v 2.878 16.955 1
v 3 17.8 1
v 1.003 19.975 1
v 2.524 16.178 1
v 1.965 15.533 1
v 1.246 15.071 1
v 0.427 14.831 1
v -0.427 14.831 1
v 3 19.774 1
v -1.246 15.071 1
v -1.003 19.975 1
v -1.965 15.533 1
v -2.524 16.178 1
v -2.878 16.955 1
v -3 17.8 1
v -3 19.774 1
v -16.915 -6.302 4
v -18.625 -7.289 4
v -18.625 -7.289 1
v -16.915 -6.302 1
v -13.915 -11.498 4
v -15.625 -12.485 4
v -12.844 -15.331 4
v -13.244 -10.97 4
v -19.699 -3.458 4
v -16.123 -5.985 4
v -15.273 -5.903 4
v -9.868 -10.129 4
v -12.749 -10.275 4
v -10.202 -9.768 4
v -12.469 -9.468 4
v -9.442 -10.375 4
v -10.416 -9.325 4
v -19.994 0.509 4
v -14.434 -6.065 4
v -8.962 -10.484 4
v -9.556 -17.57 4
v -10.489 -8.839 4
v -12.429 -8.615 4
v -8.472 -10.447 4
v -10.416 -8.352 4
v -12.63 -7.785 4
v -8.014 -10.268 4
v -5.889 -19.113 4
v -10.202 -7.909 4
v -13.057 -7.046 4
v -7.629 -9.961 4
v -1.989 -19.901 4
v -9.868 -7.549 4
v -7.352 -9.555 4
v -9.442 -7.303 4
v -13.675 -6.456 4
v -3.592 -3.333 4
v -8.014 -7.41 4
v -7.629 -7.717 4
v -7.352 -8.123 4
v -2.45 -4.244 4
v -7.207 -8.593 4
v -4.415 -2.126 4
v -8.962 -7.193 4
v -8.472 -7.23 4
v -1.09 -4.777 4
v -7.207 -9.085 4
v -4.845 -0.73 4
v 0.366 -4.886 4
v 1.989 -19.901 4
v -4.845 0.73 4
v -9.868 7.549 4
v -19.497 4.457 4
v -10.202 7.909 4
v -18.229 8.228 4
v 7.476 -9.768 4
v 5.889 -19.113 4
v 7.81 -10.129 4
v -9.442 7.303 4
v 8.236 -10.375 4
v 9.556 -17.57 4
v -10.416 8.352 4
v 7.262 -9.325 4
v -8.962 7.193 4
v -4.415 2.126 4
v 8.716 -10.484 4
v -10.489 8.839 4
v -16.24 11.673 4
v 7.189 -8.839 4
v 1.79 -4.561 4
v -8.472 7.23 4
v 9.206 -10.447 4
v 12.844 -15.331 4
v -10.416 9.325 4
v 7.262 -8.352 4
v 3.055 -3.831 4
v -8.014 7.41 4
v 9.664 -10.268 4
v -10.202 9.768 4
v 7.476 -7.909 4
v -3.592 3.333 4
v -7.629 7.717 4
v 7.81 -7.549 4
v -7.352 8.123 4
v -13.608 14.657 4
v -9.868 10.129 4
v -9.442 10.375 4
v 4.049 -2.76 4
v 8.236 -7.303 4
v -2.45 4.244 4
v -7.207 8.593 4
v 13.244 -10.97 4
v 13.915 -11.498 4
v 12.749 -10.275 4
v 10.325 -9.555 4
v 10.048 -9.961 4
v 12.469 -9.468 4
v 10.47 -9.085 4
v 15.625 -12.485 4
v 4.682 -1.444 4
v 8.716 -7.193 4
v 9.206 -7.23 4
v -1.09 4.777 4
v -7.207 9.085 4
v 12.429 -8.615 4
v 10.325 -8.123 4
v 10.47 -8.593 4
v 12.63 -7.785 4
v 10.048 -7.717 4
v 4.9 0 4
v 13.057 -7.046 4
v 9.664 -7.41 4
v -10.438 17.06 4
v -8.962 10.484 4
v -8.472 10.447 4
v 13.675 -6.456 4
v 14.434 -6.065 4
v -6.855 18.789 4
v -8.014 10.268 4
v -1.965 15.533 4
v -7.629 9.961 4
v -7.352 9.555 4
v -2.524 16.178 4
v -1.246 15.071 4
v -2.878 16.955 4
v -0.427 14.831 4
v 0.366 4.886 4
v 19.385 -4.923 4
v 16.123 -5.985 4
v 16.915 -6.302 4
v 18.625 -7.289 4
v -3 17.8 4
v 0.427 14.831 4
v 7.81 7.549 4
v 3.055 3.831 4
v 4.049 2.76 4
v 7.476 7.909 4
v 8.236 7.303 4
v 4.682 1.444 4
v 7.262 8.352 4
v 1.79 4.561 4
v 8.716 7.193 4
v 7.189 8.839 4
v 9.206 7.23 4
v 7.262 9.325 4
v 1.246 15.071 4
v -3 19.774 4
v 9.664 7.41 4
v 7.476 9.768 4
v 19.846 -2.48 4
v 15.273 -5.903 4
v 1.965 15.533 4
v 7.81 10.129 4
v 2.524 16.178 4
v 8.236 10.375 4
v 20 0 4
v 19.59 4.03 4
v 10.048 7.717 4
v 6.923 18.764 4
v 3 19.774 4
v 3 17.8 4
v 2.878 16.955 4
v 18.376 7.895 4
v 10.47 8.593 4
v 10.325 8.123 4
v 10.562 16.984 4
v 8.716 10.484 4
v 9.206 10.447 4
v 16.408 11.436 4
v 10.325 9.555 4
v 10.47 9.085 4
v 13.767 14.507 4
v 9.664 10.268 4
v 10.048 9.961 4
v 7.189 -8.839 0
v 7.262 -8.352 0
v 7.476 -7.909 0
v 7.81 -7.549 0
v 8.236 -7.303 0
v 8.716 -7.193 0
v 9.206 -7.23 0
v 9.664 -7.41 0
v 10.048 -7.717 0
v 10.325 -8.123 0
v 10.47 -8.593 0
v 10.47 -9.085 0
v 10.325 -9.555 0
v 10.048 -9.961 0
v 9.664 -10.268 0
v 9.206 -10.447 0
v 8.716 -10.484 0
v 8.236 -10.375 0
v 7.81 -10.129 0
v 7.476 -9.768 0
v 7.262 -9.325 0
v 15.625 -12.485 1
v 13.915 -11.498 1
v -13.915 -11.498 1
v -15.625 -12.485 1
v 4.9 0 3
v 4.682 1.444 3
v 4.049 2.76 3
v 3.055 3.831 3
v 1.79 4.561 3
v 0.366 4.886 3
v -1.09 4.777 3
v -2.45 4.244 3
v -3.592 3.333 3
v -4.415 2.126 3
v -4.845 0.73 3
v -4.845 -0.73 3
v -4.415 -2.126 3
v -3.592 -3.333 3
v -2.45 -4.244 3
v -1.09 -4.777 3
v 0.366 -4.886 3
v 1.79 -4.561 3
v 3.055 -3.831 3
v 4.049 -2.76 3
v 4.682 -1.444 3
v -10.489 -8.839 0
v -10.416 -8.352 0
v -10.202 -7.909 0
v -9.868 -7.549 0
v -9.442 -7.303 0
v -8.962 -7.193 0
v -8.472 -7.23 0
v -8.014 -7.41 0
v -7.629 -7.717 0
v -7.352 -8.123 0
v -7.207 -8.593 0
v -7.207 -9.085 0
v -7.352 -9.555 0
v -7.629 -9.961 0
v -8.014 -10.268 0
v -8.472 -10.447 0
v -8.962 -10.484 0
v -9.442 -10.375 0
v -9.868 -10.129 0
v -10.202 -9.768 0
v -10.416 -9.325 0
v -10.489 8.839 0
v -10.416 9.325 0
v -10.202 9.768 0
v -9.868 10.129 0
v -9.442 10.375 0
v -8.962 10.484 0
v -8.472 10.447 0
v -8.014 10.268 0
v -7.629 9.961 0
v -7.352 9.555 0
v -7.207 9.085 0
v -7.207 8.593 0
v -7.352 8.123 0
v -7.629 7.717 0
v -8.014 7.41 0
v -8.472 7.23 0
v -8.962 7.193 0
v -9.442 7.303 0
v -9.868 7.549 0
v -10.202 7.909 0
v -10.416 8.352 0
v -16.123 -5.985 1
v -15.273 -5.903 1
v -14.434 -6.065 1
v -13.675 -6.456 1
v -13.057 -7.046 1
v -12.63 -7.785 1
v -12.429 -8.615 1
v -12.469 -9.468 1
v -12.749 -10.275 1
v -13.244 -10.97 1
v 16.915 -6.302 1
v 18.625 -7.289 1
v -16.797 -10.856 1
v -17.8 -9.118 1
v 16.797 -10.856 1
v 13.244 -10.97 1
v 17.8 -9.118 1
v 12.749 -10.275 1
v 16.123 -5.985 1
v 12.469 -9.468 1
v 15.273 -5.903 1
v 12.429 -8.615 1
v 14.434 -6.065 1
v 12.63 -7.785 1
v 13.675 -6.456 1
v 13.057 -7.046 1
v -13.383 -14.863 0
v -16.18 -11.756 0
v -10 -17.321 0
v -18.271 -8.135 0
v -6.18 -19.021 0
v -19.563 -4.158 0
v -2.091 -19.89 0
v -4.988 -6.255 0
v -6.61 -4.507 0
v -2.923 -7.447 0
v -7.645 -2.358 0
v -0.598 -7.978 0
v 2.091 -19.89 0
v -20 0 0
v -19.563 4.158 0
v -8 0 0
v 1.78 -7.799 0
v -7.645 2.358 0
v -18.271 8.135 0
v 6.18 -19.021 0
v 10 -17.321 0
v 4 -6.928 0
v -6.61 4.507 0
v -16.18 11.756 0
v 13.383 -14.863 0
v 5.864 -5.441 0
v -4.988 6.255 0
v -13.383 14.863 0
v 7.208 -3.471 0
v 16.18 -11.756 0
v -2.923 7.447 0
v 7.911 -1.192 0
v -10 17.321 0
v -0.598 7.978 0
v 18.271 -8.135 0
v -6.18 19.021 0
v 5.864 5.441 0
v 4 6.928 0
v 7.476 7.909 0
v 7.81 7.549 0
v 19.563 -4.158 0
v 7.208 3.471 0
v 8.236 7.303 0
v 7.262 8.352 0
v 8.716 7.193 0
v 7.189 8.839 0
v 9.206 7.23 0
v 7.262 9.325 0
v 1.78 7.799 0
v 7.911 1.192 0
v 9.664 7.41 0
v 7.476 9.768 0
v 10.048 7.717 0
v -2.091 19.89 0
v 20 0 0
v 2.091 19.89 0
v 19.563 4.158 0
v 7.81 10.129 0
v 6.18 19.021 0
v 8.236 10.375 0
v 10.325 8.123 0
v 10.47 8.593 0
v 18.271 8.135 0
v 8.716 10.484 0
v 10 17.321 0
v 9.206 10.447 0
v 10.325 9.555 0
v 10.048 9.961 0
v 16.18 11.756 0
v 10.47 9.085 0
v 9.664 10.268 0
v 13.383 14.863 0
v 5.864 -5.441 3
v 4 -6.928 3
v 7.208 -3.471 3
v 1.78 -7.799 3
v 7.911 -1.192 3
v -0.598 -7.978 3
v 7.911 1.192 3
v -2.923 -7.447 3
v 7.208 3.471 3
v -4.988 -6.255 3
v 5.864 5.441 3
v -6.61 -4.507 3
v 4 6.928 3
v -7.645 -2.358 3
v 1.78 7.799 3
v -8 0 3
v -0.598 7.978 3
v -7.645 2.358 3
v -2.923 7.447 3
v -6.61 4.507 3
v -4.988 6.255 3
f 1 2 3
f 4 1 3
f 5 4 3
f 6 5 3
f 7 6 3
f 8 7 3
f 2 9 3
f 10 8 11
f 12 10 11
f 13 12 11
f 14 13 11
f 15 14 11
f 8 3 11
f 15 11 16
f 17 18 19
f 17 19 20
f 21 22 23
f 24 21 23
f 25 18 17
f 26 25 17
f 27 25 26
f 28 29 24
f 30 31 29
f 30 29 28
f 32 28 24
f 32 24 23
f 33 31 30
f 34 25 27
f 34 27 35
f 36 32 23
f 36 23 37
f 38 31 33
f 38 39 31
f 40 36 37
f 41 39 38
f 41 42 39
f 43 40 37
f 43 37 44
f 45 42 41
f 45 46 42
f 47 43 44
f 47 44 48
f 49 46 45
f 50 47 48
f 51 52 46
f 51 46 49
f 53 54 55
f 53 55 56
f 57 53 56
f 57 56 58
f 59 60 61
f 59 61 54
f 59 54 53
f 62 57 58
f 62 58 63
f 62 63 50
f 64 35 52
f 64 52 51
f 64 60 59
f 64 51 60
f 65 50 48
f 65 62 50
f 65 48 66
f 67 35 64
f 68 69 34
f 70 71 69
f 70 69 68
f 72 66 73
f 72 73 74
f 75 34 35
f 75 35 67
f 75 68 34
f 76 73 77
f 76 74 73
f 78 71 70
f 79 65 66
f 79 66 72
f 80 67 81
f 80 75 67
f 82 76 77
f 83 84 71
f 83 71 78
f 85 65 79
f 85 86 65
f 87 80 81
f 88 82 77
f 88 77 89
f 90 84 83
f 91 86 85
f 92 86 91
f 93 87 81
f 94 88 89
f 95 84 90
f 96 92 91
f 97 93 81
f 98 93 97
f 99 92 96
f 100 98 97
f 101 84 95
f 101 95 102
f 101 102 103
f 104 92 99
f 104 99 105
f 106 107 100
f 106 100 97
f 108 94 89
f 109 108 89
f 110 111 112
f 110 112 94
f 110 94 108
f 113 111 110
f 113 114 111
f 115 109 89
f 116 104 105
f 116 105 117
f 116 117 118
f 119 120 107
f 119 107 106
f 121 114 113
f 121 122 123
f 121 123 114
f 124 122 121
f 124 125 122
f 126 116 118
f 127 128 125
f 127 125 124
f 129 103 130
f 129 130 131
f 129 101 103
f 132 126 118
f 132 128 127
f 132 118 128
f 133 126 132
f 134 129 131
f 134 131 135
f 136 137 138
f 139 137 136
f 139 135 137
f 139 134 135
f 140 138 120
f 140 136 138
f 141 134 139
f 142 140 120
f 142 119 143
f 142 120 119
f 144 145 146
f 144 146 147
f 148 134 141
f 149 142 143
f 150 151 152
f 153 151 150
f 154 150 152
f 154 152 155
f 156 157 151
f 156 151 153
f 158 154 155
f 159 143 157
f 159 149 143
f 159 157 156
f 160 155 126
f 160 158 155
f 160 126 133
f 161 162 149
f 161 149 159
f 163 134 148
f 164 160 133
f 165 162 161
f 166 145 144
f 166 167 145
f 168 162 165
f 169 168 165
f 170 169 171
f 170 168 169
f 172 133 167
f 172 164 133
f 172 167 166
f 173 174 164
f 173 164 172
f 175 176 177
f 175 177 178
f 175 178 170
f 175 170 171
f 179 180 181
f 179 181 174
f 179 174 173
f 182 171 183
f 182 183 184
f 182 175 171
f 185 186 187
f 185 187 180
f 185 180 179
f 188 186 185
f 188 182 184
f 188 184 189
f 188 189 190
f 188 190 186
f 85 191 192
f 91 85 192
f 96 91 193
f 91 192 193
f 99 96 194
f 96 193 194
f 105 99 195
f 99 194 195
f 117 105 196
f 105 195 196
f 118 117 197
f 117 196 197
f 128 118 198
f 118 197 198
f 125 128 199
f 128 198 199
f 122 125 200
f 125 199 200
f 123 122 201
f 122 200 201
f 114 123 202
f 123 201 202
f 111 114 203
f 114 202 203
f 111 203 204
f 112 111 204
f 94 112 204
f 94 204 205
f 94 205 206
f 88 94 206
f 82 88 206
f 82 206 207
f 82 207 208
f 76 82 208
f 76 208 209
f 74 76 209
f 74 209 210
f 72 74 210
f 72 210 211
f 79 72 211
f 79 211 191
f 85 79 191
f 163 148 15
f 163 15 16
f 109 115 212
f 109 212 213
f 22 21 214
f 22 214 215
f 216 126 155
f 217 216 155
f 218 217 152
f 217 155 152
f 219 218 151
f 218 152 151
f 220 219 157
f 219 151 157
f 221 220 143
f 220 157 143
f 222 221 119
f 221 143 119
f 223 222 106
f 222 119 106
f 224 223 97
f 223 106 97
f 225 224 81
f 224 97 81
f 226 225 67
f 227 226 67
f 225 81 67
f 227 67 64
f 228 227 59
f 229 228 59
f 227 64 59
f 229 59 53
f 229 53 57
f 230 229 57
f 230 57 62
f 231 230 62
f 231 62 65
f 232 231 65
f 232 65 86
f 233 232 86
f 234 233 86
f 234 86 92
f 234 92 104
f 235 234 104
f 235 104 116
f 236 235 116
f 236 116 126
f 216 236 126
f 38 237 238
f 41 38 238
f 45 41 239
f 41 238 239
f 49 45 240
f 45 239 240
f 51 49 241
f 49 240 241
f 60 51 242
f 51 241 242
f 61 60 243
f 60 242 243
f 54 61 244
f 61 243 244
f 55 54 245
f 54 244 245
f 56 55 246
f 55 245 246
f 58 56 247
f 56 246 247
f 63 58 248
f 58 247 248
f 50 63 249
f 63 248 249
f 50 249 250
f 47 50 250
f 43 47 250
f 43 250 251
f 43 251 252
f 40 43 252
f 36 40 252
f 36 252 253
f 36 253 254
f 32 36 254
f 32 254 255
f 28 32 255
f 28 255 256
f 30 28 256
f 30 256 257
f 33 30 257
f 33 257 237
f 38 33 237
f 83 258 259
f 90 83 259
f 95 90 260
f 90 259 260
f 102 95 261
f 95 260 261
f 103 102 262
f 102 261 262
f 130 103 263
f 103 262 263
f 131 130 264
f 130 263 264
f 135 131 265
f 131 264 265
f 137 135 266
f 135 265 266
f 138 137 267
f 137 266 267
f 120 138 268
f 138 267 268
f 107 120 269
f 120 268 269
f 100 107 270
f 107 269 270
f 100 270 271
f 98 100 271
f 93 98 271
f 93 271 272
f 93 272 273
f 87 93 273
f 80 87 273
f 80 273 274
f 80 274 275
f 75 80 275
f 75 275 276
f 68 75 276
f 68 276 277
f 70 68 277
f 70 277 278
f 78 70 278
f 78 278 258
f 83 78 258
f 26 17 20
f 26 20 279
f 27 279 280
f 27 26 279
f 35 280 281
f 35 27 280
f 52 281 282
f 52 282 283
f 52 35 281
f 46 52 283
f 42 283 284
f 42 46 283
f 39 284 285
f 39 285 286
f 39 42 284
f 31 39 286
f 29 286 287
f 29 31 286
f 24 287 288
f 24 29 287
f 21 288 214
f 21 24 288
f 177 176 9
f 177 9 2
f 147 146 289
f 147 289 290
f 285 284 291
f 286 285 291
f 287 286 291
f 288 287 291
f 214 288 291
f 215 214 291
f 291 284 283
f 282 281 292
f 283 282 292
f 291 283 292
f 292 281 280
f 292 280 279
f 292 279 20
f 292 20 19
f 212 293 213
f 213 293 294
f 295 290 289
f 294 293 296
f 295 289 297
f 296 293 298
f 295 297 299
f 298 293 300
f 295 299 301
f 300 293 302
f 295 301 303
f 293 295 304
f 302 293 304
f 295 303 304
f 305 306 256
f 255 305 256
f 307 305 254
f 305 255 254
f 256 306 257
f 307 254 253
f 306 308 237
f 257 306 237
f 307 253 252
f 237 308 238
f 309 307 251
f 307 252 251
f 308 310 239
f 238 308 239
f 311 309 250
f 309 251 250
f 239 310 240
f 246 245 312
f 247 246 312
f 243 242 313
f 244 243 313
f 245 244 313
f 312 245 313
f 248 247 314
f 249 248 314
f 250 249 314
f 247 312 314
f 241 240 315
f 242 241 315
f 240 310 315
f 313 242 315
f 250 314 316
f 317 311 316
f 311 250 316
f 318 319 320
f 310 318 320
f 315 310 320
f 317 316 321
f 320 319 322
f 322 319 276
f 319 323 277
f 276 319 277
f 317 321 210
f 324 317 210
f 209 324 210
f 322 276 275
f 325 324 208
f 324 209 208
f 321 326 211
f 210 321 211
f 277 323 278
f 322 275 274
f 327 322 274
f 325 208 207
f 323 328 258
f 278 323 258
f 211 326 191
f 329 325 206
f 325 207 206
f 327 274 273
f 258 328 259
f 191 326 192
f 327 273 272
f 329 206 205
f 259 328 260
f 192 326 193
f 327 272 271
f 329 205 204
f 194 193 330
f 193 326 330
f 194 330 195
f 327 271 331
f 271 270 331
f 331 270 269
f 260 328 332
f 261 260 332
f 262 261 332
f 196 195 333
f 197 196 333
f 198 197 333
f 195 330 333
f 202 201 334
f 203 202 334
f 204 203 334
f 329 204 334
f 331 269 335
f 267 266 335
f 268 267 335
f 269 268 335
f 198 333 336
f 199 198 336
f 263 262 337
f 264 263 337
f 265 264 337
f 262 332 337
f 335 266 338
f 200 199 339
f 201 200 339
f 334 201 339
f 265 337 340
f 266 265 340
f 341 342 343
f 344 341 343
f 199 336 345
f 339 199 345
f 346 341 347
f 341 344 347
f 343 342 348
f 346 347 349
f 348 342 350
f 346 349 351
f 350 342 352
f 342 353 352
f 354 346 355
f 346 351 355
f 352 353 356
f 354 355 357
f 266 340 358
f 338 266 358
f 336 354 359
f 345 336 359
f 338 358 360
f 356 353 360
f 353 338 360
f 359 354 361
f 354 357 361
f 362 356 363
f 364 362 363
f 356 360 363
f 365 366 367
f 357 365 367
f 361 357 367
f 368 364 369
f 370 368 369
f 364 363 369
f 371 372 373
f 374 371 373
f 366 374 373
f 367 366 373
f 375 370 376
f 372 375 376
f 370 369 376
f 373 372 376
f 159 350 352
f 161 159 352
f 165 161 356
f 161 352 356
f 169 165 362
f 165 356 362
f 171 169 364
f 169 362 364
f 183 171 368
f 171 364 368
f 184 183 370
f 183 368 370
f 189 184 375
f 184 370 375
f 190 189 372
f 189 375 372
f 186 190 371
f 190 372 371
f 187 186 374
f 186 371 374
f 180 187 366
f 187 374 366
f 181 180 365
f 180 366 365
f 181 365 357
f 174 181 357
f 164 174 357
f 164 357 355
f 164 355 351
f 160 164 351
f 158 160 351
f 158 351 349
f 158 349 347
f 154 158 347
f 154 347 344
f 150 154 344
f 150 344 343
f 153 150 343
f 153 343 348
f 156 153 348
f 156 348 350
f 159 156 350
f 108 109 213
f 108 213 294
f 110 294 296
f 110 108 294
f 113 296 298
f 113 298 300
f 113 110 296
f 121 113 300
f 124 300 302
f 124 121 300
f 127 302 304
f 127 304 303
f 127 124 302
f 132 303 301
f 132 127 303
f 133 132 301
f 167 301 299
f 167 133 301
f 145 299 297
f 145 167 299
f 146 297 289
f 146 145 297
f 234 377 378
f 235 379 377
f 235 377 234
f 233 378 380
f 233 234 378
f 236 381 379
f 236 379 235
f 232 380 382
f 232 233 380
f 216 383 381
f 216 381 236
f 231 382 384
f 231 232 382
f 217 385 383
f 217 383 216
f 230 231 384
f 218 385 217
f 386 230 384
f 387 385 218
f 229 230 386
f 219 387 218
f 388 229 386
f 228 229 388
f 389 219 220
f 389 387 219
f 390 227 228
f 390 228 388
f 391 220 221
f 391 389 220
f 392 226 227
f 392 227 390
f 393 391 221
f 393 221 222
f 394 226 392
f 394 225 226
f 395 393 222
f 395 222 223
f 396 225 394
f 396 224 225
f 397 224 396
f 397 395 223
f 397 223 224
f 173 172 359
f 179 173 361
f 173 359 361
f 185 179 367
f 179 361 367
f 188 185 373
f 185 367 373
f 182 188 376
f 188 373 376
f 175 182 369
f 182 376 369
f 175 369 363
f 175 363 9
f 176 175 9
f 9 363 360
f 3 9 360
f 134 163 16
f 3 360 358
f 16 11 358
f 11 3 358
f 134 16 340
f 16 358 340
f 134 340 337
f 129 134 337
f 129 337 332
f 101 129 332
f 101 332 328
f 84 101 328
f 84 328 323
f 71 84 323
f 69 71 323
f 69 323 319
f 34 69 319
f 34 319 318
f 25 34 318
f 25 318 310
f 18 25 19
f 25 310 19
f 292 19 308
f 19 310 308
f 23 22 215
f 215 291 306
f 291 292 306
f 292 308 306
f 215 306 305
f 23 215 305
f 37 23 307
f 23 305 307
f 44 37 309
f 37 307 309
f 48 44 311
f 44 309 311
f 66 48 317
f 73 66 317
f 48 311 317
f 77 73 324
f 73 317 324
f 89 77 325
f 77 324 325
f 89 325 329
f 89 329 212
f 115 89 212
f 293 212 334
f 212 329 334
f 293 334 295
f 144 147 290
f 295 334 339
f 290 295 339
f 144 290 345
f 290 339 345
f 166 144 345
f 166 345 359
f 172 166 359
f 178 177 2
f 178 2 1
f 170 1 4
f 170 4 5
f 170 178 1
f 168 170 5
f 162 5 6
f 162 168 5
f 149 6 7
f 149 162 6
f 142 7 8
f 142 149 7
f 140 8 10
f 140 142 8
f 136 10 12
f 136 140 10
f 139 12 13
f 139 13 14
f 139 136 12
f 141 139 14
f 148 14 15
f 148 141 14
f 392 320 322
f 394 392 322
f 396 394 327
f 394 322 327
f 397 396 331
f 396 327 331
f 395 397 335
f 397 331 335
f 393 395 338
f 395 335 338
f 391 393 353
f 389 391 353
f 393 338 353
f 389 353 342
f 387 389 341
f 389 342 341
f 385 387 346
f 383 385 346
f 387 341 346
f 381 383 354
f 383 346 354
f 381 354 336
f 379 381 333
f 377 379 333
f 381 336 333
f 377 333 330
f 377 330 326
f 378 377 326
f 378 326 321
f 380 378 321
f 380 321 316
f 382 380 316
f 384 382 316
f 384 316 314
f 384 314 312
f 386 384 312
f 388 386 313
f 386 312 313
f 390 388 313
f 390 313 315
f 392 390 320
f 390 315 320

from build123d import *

# Parameters (mm, degrees)
SKETCH1_R             = 20
BOSS_EXTRUDE1_DEPTH   = 4
CUT_EXTRUDE1_DEPTH    = 3
M4X0_7_TAPPED_HOLE1_D = 3.3
SKETCH5_R             = 4.9
CUT_EXTRUDE2_DEPTH    = 5
SKETCH6_R             = 8
CUT_EXTRUDE3_DEPTH    = 3


with BuildPart() as part:
    # Sketch1 → Boss-Extrude1 (new body)
    with BuildSketch(Plane.XY):
        Circle(SKETCH1_R)
    extrude(amount=BOSS_EXTRUDE1_DEPTH)

    # Sketch2 → Cut-Extrude1 (cut)
    with BuildSketch(Plane.XY.offset(4)):
        with BuildLine():
            Line((-3, 17.8), (-3, 25))
            Line((-3, 25), (3, 25))
            Line((3, 25), (3, 17.8))
            ThreePointArc((3, 17.8), (0, 14.8), (-3, 17.8))
        make_face()
        with BuildLine():
            Line((16.915252187, -6.301923789), (23.150635095, -9.901923789))
            Line((23.150635095, -9.901923789), (20.150635095, -15.098076211))
            Line((20.150635095, -15.098076211), (13.915252187, -11.498076211))
            ThreePointArc((13.915252187, -11.498076211), (12.817175976, -7.4), (16.915252187, -6.301923789))
        make_face()
        with BuildLine():
            Line((-13.915252187, -11.498076211), (-20.150635095, -15.098076211))
            Line((-20.150635095, -15.098076211), (-23.150635095, -9.901923789))
            Line((-23.150635095, -9.901923789), (-16.915252187, -6.301923789))
            ThreePointArc((-16.915252187, -6.301923789), (-12.817175976, -7.4), (-13.915252187, -11.498076211))
        make_face()
    extrude(amount=-CUT_EXTRUDE1_DEPTH, mode=Mode.SUBTRACT)

    # M4x0.7 Tapped Hole1 (through all)
    with Locations(Plane.XY.offset(4)):
        with Locations((-8.838834765, 8.838834765), (8.838834765, 8.838834765), (8.838834765, -8.838834765), (-8.838834765, -8.838834765)):
            Hole(M4X0_7_TAPPED_HOLE1_D / 2)

    # Sketch5 → Cut-Extrude2 (cut, through all)
    with BuildSketch(Plane.XY.offset(4)):
        Circle(SKETCH5_R)
    extrude(amount=-CUT_EXTRUDE2_DEPTH, mode=Mode.SUBTRACT)

    # Sketch6 → Cut-Extrude3 (cut)
    with BuildSketch(Plane(origin=(0, 0, 0), x_dir=(-1, 0, 0), z_dir=(0, 0, -1))):
        Circle(SKETCH6_R)
    extrude(amount=-CUT_EXTRUDE3_DEPTH, mode=Mode.SUBTRACT)


solid = part.part
